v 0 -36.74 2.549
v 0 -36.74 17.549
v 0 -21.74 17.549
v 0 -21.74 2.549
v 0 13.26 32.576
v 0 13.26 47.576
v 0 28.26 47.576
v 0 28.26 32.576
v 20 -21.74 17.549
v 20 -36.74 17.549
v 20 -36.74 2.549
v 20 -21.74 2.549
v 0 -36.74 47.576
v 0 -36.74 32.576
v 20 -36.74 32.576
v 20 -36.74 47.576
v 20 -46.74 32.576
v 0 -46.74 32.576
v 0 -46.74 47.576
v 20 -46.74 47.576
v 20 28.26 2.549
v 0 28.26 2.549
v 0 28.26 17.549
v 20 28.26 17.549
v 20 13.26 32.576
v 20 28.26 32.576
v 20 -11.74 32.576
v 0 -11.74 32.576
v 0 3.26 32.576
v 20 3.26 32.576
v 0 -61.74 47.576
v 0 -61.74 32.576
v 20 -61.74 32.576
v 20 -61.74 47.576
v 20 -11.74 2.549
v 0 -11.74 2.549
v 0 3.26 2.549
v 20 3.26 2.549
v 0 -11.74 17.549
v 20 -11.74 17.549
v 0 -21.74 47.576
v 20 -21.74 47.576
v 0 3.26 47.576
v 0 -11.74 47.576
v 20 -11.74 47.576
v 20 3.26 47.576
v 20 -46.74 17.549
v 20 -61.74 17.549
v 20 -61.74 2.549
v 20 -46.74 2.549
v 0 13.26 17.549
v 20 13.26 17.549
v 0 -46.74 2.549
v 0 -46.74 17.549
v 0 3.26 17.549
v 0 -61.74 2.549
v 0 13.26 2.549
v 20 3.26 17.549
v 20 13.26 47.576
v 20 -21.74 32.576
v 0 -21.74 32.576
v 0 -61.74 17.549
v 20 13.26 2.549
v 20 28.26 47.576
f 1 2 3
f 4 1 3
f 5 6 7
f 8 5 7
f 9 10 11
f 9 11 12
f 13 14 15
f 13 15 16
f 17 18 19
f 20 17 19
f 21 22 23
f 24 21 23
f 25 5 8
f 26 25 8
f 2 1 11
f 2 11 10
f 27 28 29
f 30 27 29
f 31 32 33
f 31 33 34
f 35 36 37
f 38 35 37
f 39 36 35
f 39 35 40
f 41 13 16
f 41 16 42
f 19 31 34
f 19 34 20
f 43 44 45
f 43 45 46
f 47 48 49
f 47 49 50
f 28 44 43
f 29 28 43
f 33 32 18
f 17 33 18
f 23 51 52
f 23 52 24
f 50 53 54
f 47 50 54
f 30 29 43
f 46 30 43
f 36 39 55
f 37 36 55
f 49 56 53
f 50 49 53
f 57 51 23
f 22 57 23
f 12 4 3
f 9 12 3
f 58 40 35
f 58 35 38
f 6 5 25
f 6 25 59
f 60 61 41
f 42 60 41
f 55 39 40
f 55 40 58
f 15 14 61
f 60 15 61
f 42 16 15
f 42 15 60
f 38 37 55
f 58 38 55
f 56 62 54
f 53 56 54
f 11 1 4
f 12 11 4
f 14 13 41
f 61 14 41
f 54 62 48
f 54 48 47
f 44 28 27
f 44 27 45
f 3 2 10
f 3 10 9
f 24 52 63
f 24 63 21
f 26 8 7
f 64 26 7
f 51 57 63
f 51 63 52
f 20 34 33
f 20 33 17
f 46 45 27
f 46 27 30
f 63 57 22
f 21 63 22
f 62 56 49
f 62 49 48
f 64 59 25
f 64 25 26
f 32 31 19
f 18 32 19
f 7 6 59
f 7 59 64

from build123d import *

# Parameters (mm, degrees)
F0_W     = 15
F0_H     = 15
F1_DEPTH = 20


with BuildPart() as f1:
    # F0 (on Right) → F1 (new body)
    with BuildSketch(Plane.YZ):
        with Locations((-54.240111, 40.076442)):
            Rectangle(F0_W, F0_H)
        with Locations((-29.240111, 40.076442)):
            Rectangle(F0_W, F0_H)
        with Locations((-4.240111, 40.076442)):
            Rectangle(F0_W, F0_H)
        with Locations((20.759889, 40.076442)):
            Rectangle(F0_W, F0_H)
        with Locations((-54.240111, 10.04946)):
            Rectangle(F0_W, F0_H)
        with Locations((-29.240111, 10.04946)):
            Rectangle(F0_W, F0_H)
        with Locations((-4.240111, 10.04946)):
            Rectangle(F0_W, F0_H)
        with Locations((20.759889, 10.04946)):
            Rectangle(F0_W, F0_H)
    extrude(amount=F1_DEPTH)


solid = f1.part
